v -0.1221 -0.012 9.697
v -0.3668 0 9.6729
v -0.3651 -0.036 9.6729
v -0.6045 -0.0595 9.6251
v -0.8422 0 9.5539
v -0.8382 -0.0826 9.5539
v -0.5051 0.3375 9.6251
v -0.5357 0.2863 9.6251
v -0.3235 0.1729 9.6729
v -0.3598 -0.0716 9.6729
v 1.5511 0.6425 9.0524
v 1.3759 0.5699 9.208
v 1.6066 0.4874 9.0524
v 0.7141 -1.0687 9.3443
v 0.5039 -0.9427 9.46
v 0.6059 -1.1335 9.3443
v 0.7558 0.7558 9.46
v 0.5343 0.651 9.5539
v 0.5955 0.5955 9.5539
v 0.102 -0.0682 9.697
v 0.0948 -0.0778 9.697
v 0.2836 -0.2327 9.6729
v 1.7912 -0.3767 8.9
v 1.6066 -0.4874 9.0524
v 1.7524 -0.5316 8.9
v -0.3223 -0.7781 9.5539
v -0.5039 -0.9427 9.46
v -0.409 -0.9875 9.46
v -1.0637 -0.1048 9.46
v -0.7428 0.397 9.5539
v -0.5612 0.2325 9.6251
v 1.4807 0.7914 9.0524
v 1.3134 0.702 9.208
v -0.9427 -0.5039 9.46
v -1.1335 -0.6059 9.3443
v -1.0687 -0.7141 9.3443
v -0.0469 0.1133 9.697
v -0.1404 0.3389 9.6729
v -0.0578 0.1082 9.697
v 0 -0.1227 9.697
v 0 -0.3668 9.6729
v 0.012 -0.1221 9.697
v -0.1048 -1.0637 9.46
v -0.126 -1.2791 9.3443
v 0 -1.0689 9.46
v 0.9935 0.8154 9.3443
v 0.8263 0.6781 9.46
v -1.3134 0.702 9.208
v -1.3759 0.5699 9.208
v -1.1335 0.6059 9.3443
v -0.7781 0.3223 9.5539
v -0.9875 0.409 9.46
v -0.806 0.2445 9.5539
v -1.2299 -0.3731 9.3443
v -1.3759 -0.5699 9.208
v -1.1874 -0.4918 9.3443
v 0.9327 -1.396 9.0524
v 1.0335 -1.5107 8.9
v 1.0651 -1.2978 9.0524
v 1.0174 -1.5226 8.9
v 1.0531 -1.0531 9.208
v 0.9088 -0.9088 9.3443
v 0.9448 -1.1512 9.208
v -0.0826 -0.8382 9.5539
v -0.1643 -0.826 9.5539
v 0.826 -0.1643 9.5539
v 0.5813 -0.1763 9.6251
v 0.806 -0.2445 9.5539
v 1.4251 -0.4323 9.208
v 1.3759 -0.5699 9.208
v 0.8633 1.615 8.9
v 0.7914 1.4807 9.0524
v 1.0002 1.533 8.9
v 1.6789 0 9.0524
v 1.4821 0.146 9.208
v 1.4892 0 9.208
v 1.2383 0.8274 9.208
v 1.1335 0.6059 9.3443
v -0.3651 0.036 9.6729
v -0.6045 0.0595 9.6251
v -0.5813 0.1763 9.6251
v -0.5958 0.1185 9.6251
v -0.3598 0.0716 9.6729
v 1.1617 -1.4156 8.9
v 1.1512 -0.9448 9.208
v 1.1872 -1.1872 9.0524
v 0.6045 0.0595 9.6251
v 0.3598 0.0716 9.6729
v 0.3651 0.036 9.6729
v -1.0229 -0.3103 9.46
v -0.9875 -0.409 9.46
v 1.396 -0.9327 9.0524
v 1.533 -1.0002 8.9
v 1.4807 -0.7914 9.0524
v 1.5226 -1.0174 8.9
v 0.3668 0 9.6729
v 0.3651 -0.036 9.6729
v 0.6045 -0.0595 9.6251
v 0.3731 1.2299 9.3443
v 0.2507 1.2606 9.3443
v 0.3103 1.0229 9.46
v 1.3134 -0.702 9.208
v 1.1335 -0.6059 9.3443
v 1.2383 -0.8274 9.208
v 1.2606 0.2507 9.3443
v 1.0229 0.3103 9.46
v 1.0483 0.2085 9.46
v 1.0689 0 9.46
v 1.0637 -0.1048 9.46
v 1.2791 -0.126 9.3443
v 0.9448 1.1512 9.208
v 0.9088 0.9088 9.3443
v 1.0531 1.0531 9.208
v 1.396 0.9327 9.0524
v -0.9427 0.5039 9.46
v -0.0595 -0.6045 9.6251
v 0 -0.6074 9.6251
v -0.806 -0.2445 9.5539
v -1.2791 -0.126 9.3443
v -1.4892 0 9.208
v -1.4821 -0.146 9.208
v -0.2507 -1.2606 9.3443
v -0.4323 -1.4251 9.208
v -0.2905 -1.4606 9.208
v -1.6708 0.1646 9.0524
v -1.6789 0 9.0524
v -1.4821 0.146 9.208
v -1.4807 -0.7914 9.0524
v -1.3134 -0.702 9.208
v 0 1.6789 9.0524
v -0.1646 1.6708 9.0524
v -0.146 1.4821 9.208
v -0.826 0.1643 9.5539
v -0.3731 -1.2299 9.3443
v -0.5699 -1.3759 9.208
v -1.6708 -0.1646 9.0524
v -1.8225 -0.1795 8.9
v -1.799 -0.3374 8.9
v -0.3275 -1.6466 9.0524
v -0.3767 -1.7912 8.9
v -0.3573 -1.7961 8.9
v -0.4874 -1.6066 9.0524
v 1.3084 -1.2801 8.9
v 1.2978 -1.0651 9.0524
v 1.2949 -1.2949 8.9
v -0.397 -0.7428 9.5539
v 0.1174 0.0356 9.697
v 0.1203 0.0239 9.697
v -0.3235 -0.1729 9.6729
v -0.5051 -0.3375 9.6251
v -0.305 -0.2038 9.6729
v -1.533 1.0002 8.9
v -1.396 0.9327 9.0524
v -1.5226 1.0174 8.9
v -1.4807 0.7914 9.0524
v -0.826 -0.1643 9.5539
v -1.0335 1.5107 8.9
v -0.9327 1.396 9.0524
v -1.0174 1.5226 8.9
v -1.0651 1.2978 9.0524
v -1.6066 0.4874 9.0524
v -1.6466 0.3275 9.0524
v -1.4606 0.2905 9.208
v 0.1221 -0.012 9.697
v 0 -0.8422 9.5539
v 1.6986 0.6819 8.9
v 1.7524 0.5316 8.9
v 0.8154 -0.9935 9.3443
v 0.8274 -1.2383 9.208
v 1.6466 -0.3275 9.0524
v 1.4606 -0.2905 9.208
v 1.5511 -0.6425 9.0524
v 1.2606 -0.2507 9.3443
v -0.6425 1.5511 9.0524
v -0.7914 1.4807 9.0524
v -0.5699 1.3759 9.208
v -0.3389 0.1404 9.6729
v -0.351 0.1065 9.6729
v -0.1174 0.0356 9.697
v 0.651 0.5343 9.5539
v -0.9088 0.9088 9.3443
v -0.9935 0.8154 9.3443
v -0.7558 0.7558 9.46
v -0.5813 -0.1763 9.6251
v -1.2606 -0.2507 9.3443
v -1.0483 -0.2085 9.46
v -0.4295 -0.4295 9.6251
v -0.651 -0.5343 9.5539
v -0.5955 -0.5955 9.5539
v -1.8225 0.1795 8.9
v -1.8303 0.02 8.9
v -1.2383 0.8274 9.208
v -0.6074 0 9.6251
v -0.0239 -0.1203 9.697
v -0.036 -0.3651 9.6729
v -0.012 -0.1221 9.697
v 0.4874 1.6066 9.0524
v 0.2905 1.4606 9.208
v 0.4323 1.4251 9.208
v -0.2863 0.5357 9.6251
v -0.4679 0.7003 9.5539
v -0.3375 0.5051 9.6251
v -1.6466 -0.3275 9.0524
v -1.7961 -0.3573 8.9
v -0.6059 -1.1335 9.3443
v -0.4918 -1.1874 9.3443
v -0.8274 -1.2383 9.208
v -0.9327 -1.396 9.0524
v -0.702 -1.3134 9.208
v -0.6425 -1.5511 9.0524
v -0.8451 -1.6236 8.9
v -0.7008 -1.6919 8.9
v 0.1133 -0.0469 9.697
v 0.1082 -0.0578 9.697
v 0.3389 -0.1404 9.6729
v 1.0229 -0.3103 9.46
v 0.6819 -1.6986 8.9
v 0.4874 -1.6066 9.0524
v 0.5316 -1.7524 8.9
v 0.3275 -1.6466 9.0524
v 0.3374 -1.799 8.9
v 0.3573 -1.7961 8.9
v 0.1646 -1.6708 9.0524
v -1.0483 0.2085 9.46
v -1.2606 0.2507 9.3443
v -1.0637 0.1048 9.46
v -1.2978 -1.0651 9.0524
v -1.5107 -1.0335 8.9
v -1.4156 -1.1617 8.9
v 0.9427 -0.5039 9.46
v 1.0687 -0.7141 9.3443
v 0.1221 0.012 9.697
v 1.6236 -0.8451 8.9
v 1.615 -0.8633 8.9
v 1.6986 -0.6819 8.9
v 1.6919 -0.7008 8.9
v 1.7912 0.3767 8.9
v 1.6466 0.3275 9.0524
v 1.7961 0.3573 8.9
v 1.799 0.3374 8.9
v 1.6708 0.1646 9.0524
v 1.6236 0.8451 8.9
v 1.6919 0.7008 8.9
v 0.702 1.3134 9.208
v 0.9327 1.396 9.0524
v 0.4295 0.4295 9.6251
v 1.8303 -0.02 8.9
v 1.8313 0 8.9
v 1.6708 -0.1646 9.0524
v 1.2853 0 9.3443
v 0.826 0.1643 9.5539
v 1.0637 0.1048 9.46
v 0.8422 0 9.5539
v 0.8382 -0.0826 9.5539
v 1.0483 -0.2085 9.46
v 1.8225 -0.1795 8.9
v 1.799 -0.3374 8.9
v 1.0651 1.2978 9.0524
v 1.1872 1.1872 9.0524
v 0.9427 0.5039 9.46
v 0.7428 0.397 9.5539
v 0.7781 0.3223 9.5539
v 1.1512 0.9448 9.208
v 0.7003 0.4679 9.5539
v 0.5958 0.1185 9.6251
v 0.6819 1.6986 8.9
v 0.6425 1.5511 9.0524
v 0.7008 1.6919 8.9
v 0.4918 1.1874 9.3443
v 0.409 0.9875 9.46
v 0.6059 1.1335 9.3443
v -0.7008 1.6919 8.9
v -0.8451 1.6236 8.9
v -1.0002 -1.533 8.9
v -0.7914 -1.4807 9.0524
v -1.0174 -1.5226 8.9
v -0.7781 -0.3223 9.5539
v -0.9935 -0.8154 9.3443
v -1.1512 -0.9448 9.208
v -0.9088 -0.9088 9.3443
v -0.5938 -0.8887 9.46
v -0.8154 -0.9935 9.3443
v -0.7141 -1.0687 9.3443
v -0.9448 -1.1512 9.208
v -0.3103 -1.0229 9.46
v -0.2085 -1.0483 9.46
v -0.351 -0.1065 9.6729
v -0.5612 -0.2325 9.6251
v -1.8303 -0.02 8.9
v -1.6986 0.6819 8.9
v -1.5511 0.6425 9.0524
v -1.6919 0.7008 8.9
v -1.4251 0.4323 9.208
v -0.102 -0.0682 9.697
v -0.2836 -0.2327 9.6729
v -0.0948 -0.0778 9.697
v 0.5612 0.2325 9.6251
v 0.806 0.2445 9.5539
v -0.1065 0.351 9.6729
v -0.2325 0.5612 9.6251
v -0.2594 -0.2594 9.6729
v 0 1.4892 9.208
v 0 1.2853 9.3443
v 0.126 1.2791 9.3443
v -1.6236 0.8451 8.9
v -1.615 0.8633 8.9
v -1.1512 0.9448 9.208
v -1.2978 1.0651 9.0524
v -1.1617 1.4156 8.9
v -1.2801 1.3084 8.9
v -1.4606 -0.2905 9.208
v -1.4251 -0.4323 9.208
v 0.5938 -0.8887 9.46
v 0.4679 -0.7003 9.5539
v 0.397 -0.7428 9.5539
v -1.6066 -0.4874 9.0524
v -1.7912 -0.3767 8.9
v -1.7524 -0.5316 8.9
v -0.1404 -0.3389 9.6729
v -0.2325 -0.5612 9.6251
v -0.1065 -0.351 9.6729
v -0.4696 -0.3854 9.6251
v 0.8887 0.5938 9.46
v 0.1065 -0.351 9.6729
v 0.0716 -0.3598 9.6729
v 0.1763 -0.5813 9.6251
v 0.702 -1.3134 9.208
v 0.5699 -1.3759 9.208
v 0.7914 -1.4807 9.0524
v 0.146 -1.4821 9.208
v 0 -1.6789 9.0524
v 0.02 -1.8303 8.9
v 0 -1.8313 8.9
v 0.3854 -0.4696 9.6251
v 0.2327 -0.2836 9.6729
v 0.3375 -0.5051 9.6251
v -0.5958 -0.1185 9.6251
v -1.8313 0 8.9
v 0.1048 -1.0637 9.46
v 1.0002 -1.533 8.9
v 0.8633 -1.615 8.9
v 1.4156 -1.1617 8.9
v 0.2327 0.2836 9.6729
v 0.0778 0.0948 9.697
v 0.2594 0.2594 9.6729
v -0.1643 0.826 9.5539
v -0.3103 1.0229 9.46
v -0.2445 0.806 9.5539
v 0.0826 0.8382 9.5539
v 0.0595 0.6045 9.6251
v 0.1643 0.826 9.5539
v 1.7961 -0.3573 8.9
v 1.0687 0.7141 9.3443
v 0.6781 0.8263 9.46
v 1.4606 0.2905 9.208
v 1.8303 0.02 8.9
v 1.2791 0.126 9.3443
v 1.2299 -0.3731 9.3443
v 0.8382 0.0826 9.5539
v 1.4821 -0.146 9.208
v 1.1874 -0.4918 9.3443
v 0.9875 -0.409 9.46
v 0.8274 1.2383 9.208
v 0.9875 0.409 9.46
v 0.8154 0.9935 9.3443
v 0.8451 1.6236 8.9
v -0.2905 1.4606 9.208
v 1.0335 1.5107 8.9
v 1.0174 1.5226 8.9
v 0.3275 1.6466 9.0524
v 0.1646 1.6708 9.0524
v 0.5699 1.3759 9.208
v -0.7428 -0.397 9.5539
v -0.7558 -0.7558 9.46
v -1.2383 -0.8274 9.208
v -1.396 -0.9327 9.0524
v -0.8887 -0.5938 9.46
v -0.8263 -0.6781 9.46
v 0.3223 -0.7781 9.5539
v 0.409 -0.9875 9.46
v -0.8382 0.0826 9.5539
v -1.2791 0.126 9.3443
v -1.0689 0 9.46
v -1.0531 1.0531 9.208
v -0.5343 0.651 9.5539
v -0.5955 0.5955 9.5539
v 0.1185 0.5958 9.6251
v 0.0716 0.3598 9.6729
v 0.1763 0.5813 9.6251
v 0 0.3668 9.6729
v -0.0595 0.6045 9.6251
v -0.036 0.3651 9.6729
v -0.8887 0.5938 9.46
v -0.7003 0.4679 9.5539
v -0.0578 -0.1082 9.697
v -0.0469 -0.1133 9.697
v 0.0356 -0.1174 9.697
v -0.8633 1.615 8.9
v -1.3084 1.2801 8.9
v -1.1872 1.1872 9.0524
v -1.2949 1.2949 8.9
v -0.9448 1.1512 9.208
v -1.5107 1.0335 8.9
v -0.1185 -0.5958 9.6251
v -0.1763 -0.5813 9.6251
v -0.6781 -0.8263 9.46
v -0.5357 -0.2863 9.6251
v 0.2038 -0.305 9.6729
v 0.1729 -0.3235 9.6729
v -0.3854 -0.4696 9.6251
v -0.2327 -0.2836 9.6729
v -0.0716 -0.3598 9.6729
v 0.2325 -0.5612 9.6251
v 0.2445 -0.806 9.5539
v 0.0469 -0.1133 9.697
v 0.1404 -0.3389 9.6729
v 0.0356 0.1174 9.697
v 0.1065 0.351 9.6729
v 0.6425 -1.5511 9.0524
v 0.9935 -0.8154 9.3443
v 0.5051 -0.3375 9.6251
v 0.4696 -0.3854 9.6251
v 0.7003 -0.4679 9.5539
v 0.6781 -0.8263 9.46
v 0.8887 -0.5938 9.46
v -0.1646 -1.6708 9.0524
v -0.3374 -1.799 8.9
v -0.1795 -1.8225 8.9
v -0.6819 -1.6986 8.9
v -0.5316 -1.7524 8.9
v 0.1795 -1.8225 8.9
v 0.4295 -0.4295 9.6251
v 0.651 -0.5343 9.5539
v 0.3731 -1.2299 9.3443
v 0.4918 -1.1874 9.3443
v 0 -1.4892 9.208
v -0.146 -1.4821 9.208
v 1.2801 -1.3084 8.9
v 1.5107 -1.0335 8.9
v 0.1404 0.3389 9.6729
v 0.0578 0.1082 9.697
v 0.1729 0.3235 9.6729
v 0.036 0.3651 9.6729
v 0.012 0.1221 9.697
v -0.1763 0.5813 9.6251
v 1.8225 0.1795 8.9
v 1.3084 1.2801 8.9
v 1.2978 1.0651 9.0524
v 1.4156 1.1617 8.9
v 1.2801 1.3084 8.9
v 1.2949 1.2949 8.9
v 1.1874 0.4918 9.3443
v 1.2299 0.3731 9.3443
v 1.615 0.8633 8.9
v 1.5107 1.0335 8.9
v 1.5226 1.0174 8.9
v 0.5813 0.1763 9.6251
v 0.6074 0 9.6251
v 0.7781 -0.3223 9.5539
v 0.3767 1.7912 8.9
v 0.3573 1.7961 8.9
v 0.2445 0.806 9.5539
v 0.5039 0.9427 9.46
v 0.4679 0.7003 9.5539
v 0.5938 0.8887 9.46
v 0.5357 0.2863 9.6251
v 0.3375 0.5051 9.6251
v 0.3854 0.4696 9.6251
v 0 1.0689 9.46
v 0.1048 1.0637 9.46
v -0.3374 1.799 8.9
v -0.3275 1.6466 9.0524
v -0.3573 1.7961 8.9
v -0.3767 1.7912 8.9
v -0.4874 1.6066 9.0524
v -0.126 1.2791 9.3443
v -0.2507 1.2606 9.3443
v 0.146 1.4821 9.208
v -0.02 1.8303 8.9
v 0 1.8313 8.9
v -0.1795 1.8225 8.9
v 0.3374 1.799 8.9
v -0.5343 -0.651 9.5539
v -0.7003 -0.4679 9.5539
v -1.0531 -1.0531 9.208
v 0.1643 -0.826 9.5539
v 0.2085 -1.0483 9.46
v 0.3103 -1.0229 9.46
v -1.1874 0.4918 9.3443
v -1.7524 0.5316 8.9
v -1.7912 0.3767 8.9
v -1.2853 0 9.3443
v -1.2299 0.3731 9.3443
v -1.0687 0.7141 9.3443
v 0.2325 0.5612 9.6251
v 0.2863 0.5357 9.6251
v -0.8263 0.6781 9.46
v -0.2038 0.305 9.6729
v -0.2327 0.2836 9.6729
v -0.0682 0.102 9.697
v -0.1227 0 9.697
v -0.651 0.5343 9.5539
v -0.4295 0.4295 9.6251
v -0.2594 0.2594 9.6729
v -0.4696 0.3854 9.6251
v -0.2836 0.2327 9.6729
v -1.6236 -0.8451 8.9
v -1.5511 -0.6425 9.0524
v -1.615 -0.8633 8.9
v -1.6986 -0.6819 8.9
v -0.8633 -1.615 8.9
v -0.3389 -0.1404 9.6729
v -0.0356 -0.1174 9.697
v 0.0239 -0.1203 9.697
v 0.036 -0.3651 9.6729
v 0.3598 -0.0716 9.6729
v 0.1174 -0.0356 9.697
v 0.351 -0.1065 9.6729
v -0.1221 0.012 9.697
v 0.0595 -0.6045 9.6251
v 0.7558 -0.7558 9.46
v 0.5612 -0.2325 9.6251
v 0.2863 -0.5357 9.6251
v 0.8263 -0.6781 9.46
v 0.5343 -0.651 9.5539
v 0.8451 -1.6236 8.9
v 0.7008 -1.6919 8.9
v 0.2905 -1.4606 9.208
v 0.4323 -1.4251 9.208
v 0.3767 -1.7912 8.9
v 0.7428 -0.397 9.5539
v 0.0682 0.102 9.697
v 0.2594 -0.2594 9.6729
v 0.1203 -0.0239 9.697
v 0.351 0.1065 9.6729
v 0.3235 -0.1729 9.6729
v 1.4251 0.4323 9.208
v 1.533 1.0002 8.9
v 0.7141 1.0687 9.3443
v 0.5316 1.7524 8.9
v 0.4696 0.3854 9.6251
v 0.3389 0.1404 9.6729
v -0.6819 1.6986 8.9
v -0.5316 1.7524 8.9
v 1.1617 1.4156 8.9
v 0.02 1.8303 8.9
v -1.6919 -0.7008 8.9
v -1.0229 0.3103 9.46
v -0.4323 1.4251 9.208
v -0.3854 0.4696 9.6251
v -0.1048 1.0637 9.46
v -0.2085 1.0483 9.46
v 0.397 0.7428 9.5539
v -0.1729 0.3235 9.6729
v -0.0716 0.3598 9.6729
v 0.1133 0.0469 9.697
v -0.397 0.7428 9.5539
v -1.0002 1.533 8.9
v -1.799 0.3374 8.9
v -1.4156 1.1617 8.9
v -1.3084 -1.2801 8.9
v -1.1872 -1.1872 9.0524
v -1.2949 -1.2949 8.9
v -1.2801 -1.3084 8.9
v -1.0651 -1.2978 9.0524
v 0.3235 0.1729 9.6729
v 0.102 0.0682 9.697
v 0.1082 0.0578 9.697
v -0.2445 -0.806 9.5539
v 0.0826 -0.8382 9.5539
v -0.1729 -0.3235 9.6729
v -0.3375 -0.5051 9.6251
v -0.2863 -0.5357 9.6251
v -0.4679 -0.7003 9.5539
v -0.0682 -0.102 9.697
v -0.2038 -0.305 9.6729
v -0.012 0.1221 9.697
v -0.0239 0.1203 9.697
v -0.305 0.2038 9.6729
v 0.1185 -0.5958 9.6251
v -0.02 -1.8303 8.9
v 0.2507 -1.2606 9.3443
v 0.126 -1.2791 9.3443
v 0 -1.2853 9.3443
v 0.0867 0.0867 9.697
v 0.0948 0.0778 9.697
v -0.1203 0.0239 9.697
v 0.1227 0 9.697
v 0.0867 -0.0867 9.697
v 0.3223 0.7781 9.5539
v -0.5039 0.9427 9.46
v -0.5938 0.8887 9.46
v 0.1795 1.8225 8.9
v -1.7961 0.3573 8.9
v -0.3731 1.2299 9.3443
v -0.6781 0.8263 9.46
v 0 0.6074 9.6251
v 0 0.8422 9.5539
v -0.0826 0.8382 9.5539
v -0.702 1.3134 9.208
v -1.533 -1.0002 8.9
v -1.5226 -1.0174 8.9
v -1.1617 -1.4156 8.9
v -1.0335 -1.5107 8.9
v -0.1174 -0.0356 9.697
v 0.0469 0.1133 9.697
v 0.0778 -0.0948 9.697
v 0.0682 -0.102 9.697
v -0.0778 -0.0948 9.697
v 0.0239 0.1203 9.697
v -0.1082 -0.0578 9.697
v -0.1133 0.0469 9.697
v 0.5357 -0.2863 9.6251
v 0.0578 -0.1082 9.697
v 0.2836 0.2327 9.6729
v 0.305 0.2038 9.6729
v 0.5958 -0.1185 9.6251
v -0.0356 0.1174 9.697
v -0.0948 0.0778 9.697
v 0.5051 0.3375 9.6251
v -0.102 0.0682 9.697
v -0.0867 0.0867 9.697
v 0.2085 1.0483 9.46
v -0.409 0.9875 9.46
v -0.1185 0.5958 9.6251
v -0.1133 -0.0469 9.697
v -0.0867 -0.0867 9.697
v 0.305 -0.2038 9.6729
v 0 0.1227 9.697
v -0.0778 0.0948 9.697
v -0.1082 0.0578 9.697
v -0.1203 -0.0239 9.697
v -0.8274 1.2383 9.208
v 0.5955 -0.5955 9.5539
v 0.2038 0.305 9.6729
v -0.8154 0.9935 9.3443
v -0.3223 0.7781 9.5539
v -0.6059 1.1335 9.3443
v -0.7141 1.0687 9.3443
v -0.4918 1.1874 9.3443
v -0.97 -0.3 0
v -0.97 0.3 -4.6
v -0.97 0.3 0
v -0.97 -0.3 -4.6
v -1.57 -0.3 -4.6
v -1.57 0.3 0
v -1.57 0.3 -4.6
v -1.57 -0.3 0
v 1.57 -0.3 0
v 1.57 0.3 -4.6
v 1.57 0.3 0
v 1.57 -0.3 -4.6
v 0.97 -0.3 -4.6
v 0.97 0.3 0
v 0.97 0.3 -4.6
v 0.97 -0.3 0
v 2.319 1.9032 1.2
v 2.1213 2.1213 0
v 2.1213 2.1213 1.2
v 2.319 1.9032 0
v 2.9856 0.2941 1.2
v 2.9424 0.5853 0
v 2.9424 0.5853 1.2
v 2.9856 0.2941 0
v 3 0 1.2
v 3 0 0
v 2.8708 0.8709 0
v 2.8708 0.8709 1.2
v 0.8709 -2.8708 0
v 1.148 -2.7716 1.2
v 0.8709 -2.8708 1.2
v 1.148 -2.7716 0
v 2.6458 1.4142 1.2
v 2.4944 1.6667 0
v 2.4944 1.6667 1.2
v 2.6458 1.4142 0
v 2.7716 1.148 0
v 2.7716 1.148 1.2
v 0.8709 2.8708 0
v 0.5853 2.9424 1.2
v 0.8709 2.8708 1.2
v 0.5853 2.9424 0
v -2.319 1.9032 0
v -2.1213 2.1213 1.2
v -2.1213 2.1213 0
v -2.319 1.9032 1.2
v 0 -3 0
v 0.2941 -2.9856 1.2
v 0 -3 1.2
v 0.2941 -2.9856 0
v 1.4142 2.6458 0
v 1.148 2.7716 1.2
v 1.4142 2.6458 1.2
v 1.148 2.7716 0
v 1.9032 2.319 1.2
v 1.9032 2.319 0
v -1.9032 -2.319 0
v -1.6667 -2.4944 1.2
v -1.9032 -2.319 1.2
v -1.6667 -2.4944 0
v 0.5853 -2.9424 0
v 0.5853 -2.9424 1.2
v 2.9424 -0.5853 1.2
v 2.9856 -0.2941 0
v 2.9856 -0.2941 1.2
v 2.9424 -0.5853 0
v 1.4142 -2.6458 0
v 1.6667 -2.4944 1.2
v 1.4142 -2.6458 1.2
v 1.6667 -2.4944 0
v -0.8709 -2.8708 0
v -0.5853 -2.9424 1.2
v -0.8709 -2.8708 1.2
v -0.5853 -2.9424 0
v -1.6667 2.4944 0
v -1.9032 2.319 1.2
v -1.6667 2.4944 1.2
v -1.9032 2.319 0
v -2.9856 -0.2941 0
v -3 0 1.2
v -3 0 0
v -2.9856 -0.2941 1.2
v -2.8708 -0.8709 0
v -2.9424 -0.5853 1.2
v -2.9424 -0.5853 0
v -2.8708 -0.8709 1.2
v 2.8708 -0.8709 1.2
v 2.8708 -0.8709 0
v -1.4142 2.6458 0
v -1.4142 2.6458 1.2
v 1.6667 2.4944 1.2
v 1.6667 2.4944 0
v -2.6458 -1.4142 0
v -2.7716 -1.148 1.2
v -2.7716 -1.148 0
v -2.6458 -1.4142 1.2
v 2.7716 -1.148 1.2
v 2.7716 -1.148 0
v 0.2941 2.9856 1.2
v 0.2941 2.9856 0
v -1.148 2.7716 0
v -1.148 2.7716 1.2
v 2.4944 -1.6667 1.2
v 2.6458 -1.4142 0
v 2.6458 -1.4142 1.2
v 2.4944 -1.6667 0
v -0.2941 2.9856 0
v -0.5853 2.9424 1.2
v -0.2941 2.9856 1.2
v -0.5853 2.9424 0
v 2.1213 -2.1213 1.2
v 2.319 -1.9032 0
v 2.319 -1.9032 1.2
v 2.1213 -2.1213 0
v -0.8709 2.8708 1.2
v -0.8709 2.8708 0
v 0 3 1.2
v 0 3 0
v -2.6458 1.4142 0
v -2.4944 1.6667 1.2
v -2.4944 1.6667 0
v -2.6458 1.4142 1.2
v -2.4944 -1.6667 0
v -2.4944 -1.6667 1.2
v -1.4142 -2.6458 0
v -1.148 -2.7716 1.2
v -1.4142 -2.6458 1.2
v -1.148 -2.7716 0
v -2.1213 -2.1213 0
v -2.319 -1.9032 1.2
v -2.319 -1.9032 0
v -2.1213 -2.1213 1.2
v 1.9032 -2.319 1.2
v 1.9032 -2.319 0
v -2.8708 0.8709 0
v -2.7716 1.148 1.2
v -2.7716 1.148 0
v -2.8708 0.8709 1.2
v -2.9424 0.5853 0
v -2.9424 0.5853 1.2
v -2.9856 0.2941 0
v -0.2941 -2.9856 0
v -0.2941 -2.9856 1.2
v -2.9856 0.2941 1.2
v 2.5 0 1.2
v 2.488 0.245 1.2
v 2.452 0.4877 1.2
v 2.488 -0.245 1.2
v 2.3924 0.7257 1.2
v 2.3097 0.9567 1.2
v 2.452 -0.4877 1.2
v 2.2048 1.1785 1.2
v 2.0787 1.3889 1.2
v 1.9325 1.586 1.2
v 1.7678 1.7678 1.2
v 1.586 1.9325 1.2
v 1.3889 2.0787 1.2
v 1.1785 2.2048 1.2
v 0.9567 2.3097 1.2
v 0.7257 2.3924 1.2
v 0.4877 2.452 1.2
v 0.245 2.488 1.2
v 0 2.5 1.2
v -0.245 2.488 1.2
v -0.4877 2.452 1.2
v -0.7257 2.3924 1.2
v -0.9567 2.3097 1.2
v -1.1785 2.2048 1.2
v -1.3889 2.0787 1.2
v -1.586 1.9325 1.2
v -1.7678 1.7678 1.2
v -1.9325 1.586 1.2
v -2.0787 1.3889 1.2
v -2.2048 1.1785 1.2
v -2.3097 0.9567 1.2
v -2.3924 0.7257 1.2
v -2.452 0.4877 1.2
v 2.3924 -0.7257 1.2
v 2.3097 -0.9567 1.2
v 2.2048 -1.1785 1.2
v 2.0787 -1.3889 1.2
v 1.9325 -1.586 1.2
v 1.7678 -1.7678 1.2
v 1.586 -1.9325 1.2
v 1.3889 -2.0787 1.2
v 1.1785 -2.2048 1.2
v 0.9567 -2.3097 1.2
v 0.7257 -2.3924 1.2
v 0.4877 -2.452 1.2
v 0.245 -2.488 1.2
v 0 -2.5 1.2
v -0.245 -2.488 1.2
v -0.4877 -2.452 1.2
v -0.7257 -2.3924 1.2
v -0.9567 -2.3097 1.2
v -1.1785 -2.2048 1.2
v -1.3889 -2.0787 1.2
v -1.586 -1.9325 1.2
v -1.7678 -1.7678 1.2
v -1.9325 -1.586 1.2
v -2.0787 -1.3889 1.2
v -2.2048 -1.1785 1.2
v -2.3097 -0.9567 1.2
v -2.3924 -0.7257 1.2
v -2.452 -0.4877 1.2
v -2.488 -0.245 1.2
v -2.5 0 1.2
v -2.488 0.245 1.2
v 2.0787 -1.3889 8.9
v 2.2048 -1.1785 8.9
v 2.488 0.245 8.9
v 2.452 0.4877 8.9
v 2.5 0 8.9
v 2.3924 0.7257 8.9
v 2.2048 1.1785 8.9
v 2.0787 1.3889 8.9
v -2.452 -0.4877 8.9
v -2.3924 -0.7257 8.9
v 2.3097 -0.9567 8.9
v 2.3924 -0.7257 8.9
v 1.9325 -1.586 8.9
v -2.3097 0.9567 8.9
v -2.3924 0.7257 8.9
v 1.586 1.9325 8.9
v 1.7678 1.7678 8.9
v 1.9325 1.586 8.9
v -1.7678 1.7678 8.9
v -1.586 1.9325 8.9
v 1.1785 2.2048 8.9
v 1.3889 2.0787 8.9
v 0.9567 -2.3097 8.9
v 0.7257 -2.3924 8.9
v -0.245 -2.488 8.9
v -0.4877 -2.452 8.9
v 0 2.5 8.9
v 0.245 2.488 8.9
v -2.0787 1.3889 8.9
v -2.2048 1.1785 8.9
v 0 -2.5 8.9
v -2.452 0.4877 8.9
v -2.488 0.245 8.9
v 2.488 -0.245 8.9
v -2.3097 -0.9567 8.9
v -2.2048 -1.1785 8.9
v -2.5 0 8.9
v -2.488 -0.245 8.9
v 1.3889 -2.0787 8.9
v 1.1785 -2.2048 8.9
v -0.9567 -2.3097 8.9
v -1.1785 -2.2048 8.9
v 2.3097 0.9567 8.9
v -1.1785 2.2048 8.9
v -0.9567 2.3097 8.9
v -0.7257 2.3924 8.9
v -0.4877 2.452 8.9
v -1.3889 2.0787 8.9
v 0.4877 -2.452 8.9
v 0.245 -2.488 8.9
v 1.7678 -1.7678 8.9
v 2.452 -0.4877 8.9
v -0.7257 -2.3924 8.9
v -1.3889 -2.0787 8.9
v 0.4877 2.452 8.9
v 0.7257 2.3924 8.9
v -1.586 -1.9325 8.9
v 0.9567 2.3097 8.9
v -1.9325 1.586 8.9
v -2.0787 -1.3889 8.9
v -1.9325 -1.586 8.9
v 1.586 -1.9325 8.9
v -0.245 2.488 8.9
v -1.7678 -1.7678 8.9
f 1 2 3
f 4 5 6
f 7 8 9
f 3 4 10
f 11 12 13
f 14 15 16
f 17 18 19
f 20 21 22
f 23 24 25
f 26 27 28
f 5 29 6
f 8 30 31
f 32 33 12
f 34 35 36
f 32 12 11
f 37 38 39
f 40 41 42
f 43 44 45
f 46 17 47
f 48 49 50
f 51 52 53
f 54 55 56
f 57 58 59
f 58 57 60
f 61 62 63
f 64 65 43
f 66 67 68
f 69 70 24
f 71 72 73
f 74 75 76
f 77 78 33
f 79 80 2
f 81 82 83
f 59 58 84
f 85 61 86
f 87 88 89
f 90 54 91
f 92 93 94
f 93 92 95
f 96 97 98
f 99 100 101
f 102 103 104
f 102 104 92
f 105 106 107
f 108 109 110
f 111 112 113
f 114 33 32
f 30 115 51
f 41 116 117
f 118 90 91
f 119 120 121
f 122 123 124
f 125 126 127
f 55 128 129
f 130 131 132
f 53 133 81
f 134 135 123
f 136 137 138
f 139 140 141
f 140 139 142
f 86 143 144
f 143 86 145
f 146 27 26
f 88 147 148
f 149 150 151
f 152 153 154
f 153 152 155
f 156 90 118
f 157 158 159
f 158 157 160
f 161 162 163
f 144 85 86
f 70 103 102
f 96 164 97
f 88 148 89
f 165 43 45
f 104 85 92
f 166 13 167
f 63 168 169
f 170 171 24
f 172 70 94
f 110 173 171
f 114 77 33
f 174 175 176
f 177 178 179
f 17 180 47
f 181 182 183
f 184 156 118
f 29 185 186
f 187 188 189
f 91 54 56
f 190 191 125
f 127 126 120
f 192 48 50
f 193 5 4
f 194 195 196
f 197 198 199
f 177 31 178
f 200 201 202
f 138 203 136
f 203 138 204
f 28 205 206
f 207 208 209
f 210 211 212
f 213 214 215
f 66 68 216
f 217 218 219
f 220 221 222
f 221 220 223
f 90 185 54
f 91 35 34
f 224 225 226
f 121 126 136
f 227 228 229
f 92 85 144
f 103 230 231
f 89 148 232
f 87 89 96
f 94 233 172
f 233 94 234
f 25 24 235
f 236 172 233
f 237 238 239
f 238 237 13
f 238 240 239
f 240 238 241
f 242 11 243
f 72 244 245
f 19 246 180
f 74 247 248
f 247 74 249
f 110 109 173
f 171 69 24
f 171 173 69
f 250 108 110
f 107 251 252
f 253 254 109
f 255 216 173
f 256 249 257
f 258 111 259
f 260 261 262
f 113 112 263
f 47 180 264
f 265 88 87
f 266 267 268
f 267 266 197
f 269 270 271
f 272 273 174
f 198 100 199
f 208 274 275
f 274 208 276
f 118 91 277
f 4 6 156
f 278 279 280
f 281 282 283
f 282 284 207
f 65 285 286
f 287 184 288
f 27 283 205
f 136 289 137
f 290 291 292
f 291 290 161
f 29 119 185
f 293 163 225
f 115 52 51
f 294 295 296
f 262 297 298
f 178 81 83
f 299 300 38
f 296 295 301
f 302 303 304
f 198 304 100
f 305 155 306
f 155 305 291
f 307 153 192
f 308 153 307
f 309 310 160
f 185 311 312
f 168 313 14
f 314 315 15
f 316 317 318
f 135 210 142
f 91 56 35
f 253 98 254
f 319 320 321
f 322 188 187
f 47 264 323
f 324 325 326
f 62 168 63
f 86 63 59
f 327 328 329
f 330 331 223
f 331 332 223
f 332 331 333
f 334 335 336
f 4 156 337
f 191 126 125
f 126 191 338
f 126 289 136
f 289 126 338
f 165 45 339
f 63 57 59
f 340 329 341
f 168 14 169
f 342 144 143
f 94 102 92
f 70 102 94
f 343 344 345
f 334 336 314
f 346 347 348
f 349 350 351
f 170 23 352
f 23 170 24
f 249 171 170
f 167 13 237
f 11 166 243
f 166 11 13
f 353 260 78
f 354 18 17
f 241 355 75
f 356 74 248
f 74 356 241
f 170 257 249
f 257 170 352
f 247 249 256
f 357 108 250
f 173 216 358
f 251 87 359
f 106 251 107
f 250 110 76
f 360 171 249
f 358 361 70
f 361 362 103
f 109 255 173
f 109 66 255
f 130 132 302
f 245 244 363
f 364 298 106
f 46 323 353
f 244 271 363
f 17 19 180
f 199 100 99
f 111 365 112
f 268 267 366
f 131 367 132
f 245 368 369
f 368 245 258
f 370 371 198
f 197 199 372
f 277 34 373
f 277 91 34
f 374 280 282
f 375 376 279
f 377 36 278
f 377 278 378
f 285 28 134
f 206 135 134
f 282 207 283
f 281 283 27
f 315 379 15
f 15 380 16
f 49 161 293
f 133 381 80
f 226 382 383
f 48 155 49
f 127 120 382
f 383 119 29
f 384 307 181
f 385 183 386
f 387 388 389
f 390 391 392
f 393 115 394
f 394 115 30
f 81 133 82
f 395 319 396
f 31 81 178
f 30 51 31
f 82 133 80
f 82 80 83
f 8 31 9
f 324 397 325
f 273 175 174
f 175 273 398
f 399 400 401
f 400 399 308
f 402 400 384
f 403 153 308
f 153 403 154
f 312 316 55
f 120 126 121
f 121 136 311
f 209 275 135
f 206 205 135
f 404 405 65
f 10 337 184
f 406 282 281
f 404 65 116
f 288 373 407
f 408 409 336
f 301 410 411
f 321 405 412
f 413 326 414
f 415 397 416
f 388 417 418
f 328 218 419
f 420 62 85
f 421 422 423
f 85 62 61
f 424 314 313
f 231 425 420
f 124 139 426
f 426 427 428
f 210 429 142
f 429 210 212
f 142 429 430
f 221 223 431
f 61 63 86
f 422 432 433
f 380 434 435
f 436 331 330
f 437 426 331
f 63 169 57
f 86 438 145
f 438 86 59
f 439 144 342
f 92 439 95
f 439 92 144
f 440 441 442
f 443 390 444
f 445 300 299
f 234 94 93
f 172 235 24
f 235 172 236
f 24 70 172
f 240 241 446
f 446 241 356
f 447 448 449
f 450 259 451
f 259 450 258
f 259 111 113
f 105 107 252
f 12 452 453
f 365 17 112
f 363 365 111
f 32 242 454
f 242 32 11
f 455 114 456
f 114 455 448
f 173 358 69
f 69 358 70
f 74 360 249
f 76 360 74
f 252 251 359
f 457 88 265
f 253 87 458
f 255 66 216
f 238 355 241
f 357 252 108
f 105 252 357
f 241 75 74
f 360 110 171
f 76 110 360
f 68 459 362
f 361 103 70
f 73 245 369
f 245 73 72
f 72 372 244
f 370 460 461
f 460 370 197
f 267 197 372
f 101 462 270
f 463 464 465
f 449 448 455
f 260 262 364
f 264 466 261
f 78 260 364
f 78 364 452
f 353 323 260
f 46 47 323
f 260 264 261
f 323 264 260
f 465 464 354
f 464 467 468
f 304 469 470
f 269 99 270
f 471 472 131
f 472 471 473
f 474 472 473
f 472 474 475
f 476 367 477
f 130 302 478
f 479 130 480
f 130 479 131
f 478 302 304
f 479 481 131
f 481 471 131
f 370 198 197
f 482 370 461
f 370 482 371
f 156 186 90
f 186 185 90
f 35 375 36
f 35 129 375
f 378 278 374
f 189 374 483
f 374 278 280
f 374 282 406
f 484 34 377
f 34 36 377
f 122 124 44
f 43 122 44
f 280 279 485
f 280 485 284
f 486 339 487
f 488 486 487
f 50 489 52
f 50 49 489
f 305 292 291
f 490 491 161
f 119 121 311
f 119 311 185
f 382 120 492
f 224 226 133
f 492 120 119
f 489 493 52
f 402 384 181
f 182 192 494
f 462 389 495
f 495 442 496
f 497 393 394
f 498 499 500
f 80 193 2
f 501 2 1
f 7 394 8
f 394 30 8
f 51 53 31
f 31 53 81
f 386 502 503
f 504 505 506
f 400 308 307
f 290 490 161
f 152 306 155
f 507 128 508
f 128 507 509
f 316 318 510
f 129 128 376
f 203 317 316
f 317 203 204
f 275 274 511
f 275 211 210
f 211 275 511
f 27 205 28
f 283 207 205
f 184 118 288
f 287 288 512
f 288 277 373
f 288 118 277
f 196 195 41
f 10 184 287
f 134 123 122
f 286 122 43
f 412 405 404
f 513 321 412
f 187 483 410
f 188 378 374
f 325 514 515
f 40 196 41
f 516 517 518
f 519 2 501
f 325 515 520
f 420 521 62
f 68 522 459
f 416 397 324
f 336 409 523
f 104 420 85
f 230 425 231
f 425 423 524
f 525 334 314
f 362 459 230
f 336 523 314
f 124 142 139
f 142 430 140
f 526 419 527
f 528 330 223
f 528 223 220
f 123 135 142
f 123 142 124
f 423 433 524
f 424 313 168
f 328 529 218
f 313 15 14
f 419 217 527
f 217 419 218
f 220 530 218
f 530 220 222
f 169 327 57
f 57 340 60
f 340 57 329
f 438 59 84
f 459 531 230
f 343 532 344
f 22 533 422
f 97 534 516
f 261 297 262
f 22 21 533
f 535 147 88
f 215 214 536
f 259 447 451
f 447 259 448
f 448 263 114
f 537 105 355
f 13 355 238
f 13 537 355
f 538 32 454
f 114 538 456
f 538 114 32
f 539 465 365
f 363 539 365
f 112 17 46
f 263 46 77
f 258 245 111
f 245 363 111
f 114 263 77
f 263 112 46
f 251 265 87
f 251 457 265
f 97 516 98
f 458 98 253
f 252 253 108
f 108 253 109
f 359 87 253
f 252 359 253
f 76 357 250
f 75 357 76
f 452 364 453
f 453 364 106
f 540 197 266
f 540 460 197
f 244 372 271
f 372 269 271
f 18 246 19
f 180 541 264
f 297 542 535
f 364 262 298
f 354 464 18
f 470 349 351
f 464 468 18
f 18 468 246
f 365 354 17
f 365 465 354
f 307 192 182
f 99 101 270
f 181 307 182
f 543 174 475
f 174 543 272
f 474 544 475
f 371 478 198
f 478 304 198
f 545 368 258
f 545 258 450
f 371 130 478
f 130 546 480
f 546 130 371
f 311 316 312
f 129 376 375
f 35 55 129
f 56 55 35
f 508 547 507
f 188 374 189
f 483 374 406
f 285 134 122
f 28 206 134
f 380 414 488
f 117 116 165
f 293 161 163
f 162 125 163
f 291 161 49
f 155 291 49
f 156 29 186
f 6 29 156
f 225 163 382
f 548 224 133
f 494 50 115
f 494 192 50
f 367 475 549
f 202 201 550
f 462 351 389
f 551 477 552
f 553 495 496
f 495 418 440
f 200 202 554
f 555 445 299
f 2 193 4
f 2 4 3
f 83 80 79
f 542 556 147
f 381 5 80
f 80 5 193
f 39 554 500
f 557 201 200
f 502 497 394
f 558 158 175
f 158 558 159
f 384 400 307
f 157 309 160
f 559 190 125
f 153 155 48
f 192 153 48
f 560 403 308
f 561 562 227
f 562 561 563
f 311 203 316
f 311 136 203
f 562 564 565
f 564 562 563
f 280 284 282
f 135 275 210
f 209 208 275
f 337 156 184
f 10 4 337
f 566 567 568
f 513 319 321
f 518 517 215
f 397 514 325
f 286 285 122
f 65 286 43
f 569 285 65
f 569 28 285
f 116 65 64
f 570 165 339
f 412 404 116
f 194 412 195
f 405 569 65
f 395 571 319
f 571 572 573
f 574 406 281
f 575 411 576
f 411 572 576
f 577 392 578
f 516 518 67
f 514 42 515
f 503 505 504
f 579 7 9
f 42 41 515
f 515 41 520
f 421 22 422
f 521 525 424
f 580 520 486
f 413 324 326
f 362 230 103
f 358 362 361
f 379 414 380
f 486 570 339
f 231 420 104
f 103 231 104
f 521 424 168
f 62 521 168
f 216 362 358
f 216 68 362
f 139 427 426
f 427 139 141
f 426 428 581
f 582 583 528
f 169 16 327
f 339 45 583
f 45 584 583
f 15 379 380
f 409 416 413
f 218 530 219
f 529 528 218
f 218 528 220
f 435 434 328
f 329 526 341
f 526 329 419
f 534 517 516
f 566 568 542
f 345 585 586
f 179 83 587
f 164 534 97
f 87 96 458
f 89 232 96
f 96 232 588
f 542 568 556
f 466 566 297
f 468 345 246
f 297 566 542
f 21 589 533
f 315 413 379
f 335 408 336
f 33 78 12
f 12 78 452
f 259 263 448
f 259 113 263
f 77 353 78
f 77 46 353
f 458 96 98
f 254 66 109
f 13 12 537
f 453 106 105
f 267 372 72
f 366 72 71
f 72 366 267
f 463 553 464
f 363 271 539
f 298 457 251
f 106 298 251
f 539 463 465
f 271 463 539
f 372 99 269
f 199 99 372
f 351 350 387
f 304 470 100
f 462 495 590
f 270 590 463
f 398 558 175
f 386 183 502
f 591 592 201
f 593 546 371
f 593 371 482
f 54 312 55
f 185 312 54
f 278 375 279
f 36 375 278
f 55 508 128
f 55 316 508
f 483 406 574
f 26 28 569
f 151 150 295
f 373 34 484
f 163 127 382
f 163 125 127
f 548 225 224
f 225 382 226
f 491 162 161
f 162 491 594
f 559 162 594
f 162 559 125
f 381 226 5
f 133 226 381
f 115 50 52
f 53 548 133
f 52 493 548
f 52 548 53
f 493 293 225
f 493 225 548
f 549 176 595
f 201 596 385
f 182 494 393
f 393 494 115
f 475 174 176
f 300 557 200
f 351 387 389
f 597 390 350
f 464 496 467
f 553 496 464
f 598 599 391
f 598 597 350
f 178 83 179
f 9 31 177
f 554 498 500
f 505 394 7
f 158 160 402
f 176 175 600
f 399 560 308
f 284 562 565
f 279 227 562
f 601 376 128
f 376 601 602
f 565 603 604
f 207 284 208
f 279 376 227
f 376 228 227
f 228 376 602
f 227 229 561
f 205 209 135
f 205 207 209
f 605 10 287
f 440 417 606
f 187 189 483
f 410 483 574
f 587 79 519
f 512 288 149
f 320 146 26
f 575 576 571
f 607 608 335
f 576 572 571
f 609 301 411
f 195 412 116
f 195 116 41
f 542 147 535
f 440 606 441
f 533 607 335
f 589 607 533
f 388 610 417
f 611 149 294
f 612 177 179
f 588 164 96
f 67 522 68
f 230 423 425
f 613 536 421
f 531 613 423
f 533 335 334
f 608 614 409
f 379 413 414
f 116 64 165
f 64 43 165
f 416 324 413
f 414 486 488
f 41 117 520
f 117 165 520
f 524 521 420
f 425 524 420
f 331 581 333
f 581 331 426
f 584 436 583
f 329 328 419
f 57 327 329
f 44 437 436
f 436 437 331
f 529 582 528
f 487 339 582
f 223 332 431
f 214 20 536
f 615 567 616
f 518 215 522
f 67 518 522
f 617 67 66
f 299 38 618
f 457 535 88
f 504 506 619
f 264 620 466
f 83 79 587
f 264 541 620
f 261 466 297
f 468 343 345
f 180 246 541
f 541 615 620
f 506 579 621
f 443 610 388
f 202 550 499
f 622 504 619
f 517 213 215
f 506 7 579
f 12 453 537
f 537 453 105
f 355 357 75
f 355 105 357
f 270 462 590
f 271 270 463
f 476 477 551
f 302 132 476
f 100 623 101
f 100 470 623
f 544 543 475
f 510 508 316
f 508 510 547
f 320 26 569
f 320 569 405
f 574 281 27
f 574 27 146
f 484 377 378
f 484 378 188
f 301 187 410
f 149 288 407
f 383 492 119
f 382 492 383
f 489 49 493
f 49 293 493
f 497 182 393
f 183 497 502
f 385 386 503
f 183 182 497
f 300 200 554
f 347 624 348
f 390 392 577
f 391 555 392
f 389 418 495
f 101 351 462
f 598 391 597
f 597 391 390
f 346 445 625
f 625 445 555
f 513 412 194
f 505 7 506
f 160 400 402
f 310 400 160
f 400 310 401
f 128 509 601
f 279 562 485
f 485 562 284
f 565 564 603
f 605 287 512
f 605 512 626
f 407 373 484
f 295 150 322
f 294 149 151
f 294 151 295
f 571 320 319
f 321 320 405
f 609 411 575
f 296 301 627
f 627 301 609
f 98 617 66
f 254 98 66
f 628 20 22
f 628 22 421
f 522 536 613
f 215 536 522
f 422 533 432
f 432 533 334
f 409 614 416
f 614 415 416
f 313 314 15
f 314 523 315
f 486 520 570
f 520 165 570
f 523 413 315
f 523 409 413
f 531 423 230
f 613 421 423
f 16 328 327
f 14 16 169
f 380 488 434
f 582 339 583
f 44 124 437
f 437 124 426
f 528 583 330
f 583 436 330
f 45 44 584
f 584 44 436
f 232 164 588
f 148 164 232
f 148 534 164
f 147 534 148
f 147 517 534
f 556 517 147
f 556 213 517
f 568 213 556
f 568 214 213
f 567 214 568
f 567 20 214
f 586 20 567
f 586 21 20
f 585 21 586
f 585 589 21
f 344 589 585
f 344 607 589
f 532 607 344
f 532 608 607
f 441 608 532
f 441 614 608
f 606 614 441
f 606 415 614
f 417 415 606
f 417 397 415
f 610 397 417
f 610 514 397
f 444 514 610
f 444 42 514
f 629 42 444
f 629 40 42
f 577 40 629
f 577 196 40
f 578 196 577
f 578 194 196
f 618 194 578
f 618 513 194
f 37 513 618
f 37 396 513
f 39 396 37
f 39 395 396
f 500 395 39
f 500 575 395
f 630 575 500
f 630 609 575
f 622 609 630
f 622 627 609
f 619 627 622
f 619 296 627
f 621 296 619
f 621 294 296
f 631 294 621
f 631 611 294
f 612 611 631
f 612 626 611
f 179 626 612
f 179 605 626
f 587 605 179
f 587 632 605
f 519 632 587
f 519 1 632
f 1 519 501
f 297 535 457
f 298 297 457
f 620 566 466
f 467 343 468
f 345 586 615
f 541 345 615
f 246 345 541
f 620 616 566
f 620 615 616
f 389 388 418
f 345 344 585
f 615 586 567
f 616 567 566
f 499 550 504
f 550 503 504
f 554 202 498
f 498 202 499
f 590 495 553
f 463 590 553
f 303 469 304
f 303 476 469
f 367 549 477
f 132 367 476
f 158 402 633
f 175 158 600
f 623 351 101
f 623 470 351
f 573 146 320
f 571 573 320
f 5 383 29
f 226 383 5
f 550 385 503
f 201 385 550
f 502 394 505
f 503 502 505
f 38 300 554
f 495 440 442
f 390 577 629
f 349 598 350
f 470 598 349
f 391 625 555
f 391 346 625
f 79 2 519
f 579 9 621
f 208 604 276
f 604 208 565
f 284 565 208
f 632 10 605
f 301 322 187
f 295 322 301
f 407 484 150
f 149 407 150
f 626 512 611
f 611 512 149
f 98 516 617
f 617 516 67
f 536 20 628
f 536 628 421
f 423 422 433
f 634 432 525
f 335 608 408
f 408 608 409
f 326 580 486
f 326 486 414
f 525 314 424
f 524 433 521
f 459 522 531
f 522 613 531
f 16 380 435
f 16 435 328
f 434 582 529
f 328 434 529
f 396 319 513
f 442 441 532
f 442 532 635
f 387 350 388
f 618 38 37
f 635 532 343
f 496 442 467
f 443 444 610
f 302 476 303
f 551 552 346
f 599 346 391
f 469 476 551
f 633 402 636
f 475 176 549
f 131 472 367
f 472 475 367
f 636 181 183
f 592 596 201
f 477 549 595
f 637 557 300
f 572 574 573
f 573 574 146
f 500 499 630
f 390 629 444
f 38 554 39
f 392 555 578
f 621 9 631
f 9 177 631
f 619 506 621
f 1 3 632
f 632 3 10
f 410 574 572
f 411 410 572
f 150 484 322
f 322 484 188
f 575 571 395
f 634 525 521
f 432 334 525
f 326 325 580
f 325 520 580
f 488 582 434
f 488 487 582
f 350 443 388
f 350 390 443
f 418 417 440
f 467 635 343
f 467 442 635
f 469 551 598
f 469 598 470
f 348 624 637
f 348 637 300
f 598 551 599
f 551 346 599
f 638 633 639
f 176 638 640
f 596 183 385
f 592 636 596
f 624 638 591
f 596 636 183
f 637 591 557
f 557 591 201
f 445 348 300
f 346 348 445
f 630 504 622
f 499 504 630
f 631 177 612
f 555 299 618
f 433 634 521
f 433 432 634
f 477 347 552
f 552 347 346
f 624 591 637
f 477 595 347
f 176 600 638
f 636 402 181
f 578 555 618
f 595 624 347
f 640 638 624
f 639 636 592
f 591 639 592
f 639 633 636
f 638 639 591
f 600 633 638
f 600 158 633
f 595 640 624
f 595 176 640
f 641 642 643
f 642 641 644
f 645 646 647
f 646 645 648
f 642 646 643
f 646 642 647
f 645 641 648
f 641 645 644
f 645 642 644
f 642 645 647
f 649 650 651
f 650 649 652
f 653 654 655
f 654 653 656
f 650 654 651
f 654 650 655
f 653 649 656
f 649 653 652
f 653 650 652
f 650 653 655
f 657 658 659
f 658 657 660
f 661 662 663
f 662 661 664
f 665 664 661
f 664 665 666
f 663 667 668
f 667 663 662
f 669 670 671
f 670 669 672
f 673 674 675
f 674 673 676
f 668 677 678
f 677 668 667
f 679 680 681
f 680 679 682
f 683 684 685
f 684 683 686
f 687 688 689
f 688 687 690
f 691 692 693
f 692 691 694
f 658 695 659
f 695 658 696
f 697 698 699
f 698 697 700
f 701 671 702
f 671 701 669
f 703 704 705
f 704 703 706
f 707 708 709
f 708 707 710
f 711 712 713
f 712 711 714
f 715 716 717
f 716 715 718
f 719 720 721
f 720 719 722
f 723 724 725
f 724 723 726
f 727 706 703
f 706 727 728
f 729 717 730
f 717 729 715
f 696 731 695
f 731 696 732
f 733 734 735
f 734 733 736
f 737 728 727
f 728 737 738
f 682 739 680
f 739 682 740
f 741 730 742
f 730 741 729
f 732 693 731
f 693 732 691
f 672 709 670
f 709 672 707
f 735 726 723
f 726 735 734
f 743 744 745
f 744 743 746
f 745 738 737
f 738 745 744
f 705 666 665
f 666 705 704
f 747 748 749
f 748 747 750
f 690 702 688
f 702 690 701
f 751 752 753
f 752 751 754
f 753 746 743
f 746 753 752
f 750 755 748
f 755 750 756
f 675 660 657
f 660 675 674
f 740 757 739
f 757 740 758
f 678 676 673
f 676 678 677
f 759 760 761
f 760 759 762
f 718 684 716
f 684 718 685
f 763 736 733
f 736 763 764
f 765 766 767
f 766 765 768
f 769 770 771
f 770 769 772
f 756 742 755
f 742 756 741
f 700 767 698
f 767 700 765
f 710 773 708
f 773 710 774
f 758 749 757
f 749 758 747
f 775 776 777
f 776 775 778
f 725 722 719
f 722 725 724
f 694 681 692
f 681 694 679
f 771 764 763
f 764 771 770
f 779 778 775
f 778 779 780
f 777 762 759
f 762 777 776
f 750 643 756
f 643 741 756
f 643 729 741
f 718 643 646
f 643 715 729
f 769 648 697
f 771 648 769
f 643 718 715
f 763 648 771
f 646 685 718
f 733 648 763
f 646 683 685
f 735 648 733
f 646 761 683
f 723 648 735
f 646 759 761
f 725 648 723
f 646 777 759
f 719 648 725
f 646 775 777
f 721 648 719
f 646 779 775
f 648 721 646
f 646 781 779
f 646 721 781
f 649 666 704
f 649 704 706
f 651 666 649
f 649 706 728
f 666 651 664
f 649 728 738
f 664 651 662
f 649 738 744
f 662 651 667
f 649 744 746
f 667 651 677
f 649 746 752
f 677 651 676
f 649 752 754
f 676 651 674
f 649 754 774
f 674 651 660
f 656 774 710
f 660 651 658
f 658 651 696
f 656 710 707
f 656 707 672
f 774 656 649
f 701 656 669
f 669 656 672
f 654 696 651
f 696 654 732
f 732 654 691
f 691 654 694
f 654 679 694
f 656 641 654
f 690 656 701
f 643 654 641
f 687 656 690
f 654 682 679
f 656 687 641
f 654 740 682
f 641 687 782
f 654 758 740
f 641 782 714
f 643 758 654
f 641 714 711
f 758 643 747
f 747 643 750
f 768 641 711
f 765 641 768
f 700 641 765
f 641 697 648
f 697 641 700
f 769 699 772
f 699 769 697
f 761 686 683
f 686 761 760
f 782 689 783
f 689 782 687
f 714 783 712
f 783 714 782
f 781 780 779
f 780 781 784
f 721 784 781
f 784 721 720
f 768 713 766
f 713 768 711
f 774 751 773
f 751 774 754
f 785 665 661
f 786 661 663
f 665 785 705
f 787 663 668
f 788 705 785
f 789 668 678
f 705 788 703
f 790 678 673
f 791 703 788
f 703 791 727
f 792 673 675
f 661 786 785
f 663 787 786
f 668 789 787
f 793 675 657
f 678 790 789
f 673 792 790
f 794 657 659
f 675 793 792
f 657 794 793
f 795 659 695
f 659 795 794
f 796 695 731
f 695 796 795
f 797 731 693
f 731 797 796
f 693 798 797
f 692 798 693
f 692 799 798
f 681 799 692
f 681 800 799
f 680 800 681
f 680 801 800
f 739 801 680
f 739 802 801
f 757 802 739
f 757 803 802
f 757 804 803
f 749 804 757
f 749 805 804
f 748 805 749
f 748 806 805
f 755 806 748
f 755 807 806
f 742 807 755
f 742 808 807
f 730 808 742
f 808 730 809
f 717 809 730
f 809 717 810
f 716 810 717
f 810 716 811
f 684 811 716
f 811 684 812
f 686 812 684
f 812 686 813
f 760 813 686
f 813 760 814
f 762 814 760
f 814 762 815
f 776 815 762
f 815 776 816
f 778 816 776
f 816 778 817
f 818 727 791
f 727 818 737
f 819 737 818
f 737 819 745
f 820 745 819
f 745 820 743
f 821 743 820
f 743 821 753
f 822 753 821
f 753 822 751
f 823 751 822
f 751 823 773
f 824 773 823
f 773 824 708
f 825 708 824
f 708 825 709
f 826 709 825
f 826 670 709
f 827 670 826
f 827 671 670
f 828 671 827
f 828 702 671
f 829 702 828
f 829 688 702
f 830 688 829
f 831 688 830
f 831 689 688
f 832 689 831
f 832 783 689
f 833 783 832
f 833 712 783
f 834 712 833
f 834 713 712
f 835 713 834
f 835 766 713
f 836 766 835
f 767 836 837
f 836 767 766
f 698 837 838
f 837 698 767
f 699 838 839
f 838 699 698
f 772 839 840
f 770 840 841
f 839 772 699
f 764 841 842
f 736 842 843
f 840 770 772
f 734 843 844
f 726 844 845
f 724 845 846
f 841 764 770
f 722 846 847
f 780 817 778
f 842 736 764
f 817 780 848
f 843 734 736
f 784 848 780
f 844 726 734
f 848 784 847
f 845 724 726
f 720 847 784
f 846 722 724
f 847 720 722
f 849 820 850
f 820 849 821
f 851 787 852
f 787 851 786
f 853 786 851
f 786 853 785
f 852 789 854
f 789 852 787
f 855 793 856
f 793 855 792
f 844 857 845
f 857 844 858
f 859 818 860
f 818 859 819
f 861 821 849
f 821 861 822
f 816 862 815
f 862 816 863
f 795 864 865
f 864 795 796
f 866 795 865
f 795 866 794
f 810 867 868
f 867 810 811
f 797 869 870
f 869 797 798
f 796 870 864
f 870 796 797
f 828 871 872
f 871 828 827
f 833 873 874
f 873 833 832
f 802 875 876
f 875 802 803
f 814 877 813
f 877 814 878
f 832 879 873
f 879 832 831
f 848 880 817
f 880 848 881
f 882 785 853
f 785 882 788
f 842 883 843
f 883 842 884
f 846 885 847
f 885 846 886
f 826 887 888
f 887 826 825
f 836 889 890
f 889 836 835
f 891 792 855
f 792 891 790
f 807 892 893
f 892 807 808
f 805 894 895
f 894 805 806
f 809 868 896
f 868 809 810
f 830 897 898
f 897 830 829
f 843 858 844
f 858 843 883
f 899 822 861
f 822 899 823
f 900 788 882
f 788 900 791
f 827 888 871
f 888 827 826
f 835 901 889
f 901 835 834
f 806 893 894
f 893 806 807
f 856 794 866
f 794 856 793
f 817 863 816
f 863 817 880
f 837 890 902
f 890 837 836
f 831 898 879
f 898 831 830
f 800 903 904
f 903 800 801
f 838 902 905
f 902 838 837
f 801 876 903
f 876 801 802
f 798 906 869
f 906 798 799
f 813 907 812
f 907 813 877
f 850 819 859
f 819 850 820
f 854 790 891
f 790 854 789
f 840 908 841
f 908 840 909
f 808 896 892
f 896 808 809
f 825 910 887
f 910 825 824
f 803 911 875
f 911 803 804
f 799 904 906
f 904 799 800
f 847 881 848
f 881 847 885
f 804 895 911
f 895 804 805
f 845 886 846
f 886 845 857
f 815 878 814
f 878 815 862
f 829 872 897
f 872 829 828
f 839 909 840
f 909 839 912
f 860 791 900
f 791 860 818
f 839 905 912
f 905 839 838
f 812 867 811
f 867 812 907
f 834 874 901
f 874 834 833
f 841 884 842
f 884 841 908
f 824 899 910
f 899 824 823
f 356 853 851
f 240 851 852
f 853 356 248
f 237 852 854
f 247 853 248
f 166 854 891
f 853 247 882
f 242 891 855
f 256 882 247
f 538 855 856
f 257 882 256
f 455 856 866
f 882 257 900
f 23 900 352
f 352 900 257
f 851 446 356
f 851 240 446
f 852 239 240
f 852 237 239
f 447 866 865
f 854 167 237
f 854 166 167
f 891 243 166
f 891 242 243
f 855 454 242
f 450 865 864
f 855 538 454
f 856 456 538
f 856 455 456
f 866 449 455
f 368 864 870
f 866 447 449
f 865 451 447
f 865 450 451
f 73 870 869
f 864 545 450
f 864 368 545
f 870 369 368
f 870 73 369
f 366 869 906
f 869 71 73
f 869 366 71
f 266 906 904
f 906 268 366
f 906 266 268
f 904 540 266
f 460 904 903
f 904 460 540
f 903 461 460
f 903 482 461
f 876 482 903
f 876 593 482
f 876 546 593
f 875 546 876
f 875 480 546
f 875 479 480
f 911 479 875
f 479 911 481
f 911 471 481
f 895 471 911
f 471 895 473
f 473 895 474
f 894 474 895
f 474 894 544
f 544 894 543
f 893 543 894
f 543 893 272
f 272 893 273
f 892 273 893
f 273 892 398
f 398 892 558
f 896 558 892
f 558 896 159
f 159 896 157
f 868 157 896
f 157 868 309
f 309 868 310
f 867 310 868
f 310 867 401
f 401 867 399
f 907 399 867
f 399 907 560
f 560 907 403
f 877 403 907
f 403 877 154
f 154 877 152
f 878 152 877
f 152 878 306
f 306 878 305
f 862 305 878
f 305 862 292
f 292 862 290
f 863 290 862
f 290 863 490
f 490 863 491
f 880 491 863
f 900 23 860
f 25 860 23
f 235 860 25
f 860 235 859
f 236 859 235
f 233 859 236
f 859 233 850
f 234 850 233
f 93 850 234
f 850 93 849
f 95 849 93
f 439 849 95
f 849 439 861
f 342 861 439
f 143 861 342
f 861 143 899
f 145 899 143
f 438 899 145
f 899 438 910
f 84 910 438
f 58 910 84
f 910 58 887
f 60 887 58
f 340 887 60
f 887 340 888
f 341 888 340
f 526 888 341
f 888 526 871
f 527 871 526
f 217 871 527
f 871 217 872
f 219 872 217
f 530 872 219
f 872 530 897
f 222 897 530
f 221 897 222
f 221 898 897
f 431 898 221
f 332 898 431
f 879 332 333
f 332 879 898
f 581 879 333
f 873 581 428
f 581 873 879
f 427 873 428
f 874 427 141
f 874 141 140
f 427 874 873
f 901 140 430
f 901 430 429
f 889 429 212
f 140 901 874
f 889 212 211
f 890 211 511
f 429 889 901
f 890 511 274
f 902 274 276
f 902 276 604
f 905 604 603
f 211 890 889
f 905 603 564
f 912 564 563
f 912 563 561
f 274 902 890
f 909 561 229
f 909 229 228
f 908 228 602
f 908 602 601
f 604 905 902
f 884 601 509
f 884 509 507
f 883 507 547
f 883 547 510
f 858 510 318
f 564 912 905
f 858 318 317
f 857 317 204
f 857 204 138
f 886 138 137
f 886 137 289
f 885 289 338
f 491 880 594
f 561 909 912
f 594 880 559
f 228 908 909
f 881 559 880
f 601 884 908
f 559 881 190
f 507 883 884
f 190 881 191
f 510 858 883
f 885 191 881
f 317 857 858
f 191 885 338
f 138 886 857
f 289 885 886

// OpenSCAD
// Parameters
led_type = 5; //[3:10:1]
lead = 5; //[2.5:10:0.5]
right_angle = 0; //[0:12:1]
eps = 0.8; //[0.5:2:0.1]
body_d = 5; //[3:10:1]
body_h = 8.5; //[4.25:17:0.5]
rim_t = 1.2; //[0.6:2.4:0.1]
rim_d = 6; //[3:12:0.5]
lead_t = 0.6; //[0.3:1.2:0.05]
lead_pitch = 2.54; //[1.27:5.08:0.01]
solder_len = 1.2; //[0.6:3:0.1]
bend_radius = 0.9; //[0.45:1.8:0.05]

$fn = 64;

module led() {
  // Robust overlap to guarantee manifold connectivity
  overlap = max(0.25, eps);

  // Z references (computed)
  z_rim_bottom = 0;
  z_rim_top    = rim_t;

  z_body_bottom = z_rim_top - overlap;
  z_body_top    = z_body_bottom + body_h;

  // Dome: use hemisphere on top of body (prevents "floating sphere" look)
  dome_r = body_d/2;
  z_dome_center = z_body_top - dome_r + overlap; // overlaps into body

  // Leads: start slightly inside rim to ensure union
  z_lead_top    = z_rim_bottom + overlap;
  z_lead_bottom = z_lead_top - lead;

  // Solder: extend from lead bottom further down, overlapping into lead
  z_solder_top    = z_lead_bottom + overlap;
  z_solder_bottom = z_solder_top - solder_len;

  color("red")
  union() {
    // Rim flange
    translate([0, 0, (z_rim_bottom + z_rim_top)/2])
      cylinder(r=rim_d/2, h=rim_t, center=true);

    // Body cylinder
    translate([0, 0, (z_body_bottom + z_body_top)/2])
      cylinder(r=body_d/2, h=body_h, center=true);

    // Dome (hemisphere) connected to body
    translate([0, 0, z_dome_center])
      intersection() {
        sphere(r=dome_r);
        // keep upper half only
        translate([0, 0, dome_r/2])
          cube([2*dome_r + 2, 2*dome_r + 2, dome_r + 2], center=true);
      }

    // Leads (vertical)
    for (sx = [-1, 1]) {
      x = sx * lead_pitch/2;

      // Main lead
      translate([x, 0, (z_lead_top + z_lead_bottom)/2])
        cube([lead_t, lead_t, (z_lead_top - z_lead_bottom)], center=true);

      // Solder extension (overlaps into lead)
      translate([x, 0, (z_solder_top + z_solder_bottom)/2])
        cube([lead_t, lead_t, (z_solder_top - z_solder_bottom)], center=true);
    }

    // Optional right-angle bend (kept connected)
    if (right_angle > 0) {
      // Horizontal segment starts at lead bottom and extends in -Y
      y_h_center = -(right_angle/2 - overlap);
      z_h_center = z_lead_bottom + lead_t/2 - overlap;

      for (sx = [-1, 1]) {
        x = sx * lead_pitch/2;

        // Horizontal segment
        translate([x, y_h_center, z_h_center])
          cube([lead_t, right_angle, lead_t], center=true);

        // Corner fillet (quarter torus) positioned to overlap both segments
        // Place torus center at the inside corner of the L
        translate([x, -lead_t/2 + overlap, z_lead_bottom + lead_t/2 - overlap])
          rotate([90, 0, 0])
            rotate_extrude(angle=90)
              translate([bend_radius, 0, 0])
                circle(r=lead_t/2);
      }
    }
  }
}

led();
